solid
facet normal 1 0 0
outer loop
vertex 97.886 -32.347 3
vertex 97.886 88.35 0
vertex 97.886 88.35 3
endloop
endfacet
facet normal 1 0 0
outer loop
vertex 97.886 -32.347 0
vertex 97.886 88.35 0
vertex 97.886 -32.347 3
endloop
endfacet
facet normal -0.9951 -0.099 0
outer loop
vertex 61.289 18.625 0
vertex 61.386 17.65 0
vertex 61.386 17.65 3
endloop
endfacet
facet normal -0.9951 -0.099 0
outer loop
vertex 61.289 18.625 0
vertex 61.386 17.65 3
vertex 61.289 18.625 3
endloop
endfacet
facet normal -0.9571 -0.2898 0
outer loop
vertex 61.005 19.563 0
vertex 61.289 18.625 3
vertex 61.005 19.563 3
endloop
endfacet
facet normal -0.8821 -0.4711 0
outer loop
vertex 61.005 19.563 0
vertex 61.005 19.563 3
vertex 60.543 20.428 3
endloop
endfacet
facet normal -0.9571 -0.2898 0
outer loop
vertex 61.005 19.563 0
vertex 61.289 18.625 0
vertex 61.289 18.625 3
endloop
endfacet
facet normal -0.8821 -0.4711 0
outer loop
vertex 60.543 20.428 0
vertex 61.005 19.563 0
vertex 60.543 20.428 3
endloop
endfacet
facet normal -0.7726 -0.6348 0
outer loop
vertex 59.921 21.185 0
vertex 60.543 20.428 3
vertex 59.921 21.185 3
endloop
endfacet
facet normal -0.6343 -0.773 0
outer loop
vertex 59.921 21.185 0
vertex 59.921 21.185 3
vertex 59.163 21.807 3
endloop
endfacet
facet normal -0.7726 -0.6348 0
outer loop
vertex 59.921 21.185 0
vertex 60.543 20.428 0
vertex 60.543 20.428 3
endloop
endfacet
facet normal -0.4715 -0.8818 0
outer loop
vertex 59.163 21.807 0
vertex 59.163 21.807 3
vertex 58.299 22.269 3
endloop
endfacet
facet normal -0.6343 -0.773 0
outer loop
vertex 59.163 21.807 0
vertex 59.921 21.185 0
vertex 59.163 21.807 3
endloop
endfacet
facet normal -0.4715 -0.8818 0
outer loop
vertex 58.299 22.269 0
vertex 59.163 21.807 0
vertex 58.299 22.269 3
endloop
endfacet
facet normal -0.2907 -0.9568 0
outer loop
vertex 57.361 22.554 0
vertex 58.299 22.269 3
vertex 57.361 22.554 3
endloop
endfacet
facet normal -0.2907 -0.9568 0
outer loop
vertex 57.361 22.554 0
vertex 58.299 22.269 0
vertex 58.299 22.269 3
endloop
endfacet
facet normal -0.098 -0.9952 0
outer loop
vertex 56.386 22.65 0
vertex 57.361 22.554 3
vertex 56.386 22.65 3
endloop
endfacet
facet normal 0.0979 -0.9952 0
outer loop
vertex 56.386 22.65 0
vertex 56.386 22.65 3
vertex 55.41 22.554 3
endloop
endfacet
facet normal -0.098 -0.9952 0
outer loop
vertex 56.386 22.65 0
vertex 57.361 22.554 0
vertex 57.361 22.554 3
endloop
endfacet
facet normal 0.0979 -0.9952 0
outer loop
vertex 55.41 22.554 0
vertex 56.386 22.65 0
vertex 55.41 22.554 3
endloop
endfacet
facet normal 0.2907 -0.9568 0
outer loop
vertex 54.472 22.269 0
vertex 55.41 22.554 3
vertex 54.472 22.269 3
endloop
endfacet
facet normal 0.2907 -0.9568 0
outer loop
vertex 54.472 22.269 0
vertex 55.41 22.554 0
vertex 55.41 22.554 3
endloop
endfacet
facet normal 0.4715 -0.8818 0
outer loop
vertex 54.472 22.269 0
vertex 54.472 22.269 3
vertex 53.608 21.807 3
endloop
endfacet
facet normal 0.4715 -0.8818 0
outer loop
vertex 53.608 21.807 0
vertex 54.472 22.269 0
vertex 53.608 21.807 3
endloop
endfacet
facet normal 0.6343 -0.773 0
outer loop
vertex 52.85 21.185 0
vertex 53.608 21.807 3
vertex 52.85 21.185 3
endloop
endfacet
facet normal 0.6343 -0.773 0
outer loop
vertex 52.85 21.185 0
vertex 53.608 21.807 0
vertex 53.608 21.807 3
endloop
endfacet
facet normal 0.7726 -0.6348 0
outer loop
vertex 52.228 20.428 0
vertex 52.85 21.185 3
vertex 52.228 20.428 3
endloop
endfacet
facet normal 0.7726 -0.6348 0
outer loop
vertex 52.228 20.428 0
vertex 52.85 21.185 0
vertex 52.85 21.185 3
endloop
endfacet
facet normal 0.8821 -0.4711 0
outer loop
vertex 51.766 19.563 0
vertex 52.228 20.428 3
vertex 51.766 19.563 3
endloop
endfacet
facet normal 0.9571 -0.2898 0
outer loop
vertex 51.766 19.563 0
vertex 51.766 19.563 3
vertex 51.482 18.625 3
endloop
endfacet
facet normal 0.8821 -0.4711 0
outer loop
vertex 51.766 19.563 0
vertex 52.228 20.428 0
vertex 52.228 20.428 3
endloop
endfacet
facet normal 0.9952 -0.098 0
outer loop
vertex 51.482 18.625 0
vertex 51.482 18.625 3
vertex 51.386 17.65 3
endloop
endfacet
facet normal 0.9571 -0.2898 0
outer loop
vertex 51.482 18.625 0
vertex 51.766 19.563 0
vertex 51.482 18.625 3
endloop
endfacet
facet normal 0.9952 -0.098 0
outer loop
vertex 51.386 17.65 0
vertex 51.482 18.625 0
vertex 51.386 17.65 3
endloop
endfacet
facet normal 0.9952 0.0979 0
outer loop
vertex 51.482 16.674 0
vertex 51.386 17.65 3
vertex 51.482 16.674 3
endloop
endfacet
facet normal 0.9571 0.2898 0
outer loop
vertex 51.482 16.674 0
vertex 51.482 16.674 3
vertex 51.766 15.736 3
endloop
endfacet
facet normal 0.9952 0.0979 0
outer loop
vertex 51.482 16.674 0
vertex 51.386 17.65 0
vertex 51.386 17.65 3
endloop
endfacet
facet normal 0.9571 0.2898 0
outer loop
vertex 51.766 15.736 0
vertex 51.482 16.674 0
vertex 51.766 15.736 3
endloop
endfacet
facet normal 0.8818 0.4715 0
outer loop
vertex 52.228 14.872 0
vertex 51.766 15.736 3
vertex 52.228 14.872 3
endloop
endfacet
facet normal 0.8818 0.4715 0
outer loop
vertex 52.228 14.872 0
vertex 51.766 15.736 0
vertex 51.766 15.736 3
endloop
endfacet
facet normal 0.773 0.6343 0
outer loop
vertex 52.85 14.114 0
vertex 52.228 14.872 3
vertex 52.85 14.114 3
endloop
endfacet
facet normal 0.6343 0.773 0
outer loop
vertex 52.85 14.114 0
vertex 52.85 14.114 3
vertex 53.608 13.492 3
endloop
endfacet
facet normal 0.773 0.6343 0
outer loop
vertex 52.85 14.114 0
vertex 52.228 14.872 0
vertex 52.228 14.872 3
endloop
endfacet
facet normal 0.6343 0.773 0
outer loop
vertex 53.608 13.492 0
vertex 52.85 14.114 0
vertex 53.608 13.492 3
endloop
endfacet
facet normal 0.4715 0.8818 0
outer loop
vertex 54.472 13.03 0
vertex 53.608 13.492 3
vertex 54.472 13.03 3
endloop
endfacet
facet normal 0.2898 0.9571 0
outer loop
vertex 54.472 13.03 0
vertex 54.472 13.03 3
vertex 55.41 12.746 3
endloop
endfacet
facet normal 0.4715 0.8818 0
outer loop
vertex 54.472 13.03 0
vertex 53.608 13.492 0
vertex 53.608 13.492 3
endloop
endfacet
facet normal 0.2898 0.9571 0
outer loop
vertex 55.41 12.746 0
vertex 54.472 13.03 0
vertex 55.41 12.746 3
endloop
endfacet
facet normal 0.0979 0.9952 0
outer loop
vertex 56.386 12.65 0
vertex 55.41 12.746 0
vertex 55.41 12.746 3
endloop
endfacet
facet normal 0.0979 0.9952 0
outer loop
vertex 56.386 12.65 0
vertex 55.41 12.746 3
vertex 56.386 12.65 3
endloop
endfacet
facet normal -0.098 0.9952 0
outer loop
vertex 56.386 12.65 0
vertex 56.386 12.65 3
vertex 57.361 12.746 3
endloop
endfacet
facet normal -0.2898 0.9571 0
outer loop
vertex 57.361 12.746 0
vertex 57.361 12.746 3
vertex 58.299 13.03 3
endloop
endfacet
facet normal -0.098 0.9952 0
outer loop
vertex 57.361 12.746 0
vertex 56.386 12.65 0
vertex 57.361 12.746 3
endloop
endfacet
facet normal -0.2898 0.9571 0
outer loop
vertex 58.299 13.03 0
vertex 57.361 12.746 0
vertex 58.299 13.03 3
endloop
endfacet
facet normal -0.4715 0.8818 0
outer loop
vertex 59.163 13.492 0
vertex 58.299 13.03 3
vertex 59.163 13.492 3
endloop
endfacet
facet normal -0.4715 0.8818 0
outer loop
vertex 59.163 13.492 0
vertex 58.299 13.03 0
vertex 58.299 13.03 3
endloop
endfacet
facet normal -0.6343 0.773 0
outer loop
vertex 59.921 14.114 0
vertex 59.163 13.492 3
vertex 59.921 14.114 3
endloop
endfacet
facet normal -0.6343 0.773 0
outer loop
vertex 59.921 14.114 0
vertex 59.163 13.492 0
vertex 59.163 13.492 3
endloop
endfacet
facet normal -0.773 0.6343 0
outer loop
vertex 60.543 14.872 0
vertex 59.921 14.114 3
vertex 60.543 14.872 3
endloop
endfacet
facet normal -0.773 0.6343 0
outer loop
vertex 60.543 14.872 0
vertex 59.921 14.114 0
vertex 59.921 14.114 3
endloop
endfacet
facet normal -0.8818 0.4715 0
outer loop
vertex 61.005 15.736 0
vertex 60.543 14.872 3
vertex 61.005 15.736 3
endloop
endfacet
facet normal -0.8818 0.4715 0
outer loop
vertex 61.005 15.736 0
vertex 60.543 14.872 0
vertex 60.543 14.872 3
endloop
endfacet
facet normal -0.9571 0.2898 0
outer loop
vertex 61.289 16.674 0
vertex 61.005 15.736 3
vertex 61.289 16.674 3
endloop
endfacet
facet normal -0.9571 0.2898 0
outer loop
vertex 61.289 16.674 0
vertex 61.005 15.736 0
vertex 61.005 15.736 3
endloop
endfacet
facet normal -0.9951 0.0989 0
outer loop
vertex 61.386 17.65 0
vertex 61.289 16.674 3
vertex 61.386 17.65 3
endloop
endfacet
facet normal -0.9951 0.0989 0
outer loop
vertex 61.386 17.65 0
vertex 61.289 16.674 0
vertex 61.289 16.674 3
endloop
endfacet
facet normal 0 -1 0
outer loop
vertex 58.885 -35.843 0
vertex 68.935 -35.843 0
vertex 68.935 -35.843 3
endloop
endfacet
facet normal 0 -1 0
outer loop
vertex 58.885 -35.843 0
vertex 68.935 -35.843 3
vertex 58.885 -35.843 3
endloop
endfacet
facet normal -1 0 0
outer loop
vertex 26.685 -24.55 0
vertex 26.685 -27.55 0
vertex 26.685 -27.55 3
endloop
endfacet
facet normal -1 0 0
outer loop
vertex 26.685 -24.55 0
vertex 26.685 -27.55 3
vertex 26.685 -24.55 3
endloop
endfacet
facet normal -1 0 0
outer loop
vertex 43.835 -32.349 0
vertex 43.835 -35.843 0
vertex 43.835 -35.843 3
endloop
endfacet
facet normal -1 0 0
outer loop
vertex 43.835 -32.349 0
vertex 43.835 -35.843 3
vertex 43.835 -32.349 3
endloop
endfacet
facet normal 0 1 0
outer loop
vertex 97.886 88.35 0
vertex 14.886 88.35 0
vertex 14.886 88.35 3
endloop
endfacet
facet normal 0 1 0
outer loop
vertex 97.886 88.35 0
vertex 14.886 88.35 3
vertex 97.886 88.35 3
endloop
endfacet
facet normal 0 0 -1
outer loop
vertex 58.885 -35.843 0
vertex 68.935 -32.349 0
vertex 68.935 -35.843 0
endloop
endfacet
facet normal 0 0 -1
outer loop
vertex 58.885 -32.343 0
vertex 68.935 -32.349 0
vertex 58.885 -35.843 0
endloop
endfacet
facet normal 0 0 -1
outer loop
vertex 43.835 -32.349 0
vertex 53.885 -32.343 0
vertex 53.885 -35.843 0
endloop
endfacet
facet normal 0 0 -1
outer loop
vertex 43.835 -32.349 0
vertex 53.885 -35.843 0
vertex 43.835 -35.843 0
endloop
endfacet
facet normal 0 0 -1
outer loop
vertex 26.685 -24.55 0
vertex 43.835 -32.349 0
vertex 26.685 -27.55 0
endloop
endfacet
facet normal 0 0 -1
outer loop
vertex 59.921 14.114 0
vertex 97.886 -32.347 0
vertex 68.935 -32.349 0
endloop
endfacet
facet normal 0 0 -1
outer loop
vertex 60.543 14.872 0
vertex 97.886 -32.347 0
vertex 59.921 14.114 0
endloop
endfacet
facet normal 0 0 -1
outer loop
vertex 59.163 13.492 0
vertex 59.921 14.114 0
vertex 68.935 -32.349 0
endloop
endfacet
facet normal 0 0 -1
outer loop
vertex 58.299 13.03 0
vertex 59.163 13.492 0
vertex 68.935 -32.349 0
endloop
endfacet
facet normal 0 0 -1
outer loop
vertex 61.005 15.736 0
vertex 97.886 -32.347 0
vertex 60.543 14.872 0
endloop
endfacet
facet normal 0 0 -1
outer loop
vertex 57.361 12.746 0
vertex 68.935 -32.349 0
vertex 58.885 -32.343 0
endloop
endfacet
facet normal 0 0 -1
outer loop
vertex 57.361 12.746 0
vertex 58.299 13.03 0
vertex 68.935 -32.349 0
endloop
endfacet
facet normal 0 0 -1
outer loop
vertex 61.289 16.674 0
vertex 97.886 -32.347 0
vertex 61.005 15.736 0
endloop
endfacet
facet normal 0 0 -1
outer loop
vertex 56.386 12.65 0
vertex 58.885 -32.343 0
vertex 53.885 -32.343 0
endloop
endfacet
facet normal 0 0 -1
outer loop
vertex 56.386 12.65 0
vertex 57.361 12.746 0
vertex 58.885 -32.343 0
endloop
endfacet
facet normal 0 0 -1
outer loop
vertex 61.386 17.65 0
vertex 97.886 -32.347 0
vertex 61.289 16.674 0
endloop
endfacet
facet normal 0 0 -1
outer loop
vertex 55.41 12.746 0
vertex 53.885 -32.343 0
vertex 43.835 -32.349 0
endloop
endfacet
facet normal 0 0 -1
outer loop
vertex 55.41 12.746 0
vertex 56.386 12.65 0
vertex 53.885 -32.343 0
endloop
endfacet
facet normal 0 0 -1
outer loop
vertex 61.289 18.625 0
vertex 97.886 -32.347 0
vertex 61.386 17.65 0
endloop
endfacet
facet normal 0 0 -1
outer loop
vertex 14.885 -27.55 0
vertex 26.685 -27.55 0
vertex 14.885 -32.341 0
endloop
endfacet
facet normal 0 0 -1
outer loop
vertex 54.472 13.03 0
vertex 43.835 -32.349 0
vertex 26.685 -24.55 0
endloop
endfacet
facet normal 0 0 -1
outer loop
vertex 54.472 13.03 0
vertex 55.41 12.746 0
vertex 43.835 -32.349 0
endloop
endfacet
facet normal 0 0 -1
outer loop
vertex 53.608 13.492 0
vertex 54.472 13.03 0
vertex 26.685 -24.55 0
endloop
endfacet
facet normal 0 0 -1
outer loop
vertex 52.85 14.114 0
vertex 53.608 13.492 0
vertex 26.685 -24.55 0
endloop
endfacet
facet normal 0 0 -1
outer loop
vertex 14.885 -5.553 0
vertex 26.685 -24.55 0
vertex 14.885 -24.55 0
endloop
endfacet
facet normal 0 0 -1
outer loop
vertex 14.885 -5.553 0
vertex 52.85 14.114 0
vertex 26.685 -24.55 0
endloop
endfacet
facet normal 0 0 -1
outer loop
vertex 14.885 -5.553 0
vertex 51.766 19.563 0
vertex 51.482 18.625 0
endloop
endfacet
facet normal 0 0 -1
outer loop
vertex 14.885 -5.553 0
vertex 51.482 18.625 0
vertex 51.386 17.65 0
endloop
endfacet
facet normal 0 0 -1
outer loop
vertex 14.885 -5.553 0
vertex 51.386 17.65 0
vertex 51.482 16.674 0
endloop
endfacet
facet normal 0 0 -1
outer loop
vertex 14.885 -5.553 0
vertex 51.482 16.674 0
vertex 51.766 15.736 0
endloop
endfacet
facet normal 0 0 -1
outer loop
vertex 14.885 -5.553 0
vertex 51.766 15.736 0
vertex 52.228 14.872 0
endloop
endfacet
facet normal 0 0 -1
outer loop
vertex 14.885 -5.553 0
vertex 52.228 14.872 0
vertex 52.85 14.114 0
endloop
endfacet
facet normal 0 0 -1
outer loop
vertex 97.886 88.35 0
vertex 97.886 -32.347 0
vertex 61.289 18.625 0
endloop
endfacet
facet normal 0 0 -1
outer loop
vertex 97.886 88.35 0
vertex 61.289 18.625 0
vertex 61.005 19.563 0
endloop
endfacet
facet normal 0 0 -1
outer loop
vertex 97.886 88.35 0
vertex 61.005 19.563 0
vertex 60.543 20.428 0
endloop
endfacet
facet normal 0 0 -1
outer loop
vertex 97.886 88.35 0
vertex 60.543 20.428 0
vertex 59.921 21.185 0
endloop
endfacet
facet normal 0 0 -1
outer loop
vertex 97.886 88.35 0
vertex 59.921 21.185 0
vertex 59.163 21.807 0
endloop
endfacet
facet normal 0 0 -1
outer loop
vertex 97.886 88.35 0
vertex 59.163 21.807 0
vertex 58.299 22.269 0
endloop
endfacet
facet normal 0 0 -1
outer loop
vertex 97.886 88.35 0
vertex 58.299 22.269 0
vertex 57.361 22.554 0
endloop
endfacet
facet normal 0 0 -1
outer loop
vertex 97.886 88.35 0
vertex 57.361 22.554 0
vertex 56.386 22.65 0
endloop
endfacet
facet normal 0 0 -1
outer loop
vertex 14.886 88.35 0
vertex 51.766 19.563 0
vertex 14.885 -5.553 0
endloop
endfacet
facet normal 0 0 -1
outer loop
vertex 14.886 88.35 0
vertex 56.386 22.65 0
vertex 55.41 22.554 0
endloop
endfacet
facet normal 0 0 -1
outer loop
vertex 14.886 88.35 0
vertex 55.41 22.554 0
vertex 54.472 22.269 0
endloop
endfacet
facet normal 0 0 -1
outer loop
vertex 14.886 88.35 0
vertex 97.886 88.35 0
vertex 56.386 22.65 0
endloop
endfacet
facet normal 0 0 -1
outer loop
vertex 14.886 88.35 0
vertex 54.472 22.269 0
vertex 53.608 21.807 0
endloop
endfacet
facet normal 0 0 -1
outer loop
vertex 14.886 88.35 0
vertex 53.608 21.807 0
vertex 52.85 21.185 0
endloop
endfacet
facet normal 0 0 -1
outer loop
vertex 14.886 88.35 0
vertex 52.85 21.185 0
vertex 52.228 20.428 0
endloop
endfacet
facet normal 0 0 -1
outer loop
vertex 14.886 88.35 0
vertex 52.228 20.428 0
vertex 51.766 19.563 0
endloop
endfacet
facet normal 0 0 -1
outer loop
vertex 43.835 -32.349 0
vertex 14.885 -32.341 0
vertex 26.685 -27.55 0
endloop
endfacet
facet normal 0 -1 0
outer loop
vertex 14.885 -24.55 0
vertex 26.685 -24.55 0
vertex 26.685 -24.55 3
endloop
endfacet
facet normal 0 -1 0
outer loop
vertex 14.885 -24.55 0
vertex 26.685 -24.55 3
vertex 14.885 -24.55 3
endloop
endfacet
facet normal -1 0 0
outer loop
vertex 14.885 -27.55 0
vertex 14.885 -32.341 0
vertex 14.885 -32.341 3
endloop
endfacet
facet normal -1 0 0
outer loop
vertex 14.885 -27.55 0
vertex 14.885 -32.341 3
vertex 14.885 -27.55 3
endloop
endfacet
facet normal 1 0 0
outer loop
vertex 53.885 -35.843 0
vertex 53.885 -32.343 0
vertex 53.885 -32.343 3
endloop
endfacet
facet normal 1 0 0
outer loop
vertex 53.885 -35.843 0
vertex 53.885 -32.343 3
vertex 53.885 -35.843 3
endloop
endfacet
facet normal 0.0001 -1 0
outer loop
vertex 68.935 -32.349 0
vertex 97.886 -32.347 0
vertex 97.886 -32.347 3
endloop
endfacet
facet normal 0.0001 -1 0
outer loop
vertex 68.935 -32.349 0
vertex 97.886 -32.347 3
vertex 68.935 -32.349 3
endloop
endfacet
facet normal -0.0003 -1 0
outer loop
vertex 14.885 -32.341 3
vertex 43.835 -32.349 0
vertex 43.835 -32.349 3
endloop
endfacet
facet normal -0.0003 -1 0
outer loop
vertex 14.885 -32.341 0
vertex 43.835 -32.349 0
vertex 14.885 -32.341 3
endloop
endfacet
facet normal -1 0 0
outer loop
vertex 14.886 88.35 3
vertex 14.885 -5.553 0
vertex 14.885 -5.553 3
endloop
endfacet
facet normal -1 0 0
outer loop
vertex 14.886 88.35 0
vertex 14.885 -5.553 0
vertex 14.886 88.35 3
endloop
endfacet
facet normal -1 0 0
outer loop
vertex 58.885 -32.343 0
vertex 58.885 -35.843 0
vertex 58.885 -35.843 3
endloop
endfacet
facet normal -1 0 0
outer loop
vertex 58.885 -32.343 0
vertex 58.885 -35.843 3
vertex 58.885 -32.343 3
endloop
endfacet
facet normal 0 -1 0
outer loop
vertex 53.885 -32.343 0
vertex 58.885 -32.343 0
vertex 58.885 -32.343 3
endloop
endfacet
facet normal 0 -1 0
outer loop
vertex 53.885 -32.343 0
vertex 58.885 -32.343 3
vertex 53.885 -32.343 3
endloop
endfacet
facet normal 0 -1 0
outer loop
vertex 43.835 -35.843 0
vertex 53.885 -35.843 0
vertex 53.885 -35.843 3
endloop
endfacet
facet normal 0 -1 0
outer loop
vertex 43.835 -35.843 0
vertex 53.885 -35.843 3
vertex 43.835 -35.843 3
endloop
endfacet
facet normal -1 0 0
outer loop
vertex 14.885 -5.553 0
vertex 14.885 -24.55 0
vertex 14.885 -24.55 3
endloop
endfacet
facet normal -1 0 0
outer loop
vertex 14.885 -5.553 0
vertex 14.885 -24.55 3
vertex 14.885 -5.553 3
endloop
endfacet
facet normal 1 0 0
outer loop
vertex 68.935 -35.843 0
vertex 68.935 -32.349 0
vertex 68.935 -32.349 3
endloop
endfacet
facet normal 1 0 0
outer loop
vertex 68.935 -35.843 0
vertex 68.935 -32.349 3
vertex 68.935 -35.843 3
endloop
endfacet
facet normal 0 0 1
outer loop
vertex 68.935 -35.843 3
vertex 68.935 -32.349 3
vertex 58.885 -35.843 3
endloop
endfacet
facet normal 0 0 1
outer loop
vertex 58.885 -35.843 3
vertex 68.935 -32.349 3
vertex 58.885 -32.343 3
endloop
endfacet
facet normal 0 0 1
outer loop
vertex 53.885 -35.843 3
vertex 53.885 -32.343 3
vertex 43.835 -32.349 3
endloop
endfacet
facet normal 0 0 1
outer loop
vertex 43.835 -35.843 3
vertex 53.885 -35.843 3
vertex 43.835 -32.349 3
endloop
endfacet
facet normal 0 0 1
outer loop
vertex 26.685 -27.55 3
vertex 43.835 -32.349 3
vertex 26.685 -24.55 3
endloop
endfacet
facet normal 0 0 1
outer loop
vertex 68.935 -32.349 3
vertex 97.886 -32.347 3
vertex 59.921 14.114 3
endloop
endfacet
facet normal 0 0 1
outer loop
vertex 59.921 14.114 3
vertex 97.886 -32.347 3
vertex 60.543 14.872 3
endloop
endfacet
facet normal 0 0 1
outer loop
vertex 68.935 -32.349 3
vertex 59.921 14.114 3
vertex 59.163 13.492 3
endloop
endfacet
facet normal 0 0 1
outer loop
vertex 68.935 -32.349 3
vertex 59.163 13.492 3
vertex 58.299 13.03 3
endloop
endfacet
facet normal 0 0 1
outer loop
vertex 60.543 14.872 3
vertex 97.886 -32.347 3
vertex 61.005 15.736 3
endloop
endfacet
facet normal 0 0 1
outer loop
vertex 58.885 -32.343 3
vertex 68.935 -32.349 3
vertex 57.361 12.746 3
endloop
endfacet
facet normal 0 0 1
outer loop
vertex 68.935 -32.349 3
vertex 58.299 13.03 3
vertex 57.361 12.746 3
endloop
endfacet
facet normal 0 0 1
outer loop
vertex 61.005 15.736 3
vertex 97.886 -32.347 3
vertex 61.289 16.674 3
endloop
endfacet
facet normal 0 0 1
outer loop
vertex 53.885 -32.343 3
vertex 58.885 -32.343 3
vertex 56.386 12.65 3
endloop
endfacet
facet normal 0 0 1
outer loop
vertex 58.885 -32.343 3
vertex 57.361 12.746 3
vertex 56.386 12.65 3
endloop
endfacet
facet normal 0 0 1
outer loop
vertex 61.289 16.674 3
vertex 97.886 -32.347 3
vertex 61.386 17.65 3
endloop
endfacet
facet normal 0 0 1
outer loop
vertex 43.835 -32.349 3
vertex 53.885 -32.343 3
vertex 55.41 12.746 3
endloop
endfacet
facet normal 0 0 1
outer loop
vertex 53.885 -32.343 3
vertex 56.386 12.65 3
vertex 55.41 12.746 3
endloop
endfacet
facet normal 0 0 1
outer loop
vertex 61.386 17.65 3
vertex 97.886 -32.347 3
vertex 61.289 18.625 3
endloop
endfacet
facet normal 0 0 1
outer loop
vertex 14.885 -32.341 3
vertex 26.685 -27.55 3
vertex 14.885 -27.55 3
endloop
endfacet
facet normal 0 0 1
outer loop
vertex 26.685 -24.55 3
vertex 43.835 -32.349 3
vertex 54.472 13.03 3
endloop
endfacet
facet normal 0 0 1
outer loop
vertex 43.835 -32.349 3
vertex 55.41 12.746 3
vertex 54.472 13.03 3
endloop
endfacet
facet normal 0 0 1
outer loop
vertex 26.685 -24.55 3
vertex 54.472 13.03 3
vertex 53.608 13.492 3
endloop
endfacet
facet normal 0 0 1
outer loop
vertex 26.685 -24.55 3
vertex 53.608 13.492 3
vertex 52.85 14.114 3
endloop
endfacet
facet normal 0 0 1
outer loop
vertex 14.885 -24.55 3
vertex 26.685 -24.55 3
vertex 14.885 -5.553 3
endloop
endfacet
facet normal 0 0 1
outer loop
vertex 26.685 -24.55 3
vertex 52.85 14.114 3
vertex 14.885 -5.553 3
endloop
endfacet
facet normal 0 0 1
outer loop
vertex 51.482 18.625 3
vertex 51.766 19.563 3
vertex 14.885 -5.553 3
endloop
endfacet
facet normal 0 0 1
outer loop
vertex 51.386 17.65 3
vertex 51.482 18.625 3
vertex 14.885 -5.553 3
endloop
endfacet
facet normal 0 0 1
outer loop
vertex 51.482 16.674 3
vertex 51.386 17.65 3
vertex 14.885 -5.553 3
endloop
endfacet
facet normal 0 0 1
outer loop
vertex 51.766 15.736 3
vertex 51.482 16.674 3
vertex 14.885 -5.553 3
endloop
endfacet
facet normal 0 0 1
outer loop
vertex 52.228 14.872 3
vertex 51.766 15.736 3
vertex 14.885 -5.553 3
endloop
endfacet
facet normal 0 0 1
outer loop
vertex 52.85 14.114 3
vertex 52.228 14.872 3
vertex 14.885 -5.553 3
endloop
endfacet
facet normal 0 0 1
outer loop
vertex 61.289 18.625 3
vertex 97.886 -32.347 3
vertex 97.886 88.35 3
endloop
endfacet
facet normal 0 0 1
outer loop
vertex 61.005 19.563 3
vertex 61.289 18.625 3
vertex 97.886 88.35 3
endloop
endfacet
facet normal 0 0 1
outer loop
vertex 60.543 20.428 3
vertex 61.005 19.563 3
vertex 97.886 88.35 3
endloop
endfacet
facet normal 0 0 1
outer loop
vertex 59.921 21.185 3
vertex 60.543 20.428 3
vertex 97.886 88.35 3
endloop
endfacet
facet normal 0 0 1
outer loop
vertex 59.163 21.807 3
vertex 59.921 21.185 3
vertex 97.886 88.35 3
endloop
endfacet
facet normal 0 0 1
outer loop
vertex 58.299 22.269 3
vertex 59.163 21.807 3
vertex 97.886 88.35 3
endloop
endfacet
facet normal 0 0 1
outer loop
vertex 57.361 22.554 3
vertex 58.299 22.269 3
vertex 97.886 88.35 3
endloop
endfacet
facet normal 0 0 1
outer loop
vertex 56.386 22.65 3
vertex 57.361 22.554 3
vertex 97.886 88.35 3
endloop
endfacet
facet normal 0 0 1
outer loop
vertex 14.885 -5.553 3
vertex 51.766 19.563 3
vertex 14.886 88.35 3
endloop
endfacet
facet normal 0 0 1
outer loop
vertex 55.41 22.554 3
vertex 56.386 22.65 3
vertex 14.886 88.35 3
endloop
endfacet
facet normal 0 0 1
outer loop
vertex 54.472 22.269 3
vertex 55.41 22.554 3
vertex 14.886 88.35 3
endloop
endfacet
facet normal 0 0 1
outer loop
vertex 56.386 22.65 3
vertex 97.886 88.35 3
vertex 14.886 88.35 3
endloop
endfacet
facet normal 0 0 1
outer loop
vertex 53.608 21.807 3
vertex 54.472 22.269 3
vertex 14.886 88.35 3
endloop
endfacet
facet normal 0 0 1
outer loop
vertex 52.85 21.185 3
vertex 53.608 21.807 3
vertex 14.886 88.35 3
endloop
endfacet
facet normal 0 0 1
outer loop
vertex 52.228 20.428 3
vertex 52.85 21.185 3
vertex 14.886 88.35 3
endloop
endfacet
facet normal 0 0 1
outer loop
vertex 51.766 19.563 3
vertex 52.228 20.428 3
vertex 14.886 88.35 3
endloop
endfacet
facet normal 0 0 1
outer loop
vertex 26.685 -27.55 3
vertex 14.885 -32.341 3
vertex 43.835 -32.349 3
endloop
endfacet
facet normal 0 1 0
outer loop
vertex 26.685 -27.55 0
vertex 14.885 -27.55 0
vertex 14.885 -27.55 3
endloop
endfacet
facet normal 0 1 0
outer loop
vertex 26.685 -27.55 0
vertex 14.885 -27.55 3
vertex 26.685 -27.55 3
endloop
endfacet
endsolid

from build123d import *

# Parameters (mm, degrees)
MODEL_R                 = 5
SALIENTE_EXTRUIR1_DEPTH = 3


with BuildPart() as part:
    # Model → Saliente-Extruir1 (new body)
    with BuildSketch(Plane.XY):
        Polygon((43.835480064, -35.842547763), (43.835480064, -32.349014415), (14.885477826, -32.340639111), (14.885479202, -27.550194175), (26.685480393, -27.550194175), (26.685480393, -24.550194175), (14.885480064, -24.550193732), (14.885483847, -5.553308235), (14.885503897, 88.349821578), (97.885505249, 88.349799035), (97.885505249, -32.347086905), (68.935480064, -32.349014415), (68.935480064, -35.842547763), (58.885480064, -35.842547763), (58.885480064, -32.342547763), (53.885480064, -32.342547763), (53.885480064, -35.842547763), align=None)
        with Locations((56.385505249, 17.649799035)):
            Circle(MODEL_R, mode=Mode.SUBTRACT)
    extrude(amount=SALIENTE_EXTRUIR1_DEPTH)


solid = part.part
